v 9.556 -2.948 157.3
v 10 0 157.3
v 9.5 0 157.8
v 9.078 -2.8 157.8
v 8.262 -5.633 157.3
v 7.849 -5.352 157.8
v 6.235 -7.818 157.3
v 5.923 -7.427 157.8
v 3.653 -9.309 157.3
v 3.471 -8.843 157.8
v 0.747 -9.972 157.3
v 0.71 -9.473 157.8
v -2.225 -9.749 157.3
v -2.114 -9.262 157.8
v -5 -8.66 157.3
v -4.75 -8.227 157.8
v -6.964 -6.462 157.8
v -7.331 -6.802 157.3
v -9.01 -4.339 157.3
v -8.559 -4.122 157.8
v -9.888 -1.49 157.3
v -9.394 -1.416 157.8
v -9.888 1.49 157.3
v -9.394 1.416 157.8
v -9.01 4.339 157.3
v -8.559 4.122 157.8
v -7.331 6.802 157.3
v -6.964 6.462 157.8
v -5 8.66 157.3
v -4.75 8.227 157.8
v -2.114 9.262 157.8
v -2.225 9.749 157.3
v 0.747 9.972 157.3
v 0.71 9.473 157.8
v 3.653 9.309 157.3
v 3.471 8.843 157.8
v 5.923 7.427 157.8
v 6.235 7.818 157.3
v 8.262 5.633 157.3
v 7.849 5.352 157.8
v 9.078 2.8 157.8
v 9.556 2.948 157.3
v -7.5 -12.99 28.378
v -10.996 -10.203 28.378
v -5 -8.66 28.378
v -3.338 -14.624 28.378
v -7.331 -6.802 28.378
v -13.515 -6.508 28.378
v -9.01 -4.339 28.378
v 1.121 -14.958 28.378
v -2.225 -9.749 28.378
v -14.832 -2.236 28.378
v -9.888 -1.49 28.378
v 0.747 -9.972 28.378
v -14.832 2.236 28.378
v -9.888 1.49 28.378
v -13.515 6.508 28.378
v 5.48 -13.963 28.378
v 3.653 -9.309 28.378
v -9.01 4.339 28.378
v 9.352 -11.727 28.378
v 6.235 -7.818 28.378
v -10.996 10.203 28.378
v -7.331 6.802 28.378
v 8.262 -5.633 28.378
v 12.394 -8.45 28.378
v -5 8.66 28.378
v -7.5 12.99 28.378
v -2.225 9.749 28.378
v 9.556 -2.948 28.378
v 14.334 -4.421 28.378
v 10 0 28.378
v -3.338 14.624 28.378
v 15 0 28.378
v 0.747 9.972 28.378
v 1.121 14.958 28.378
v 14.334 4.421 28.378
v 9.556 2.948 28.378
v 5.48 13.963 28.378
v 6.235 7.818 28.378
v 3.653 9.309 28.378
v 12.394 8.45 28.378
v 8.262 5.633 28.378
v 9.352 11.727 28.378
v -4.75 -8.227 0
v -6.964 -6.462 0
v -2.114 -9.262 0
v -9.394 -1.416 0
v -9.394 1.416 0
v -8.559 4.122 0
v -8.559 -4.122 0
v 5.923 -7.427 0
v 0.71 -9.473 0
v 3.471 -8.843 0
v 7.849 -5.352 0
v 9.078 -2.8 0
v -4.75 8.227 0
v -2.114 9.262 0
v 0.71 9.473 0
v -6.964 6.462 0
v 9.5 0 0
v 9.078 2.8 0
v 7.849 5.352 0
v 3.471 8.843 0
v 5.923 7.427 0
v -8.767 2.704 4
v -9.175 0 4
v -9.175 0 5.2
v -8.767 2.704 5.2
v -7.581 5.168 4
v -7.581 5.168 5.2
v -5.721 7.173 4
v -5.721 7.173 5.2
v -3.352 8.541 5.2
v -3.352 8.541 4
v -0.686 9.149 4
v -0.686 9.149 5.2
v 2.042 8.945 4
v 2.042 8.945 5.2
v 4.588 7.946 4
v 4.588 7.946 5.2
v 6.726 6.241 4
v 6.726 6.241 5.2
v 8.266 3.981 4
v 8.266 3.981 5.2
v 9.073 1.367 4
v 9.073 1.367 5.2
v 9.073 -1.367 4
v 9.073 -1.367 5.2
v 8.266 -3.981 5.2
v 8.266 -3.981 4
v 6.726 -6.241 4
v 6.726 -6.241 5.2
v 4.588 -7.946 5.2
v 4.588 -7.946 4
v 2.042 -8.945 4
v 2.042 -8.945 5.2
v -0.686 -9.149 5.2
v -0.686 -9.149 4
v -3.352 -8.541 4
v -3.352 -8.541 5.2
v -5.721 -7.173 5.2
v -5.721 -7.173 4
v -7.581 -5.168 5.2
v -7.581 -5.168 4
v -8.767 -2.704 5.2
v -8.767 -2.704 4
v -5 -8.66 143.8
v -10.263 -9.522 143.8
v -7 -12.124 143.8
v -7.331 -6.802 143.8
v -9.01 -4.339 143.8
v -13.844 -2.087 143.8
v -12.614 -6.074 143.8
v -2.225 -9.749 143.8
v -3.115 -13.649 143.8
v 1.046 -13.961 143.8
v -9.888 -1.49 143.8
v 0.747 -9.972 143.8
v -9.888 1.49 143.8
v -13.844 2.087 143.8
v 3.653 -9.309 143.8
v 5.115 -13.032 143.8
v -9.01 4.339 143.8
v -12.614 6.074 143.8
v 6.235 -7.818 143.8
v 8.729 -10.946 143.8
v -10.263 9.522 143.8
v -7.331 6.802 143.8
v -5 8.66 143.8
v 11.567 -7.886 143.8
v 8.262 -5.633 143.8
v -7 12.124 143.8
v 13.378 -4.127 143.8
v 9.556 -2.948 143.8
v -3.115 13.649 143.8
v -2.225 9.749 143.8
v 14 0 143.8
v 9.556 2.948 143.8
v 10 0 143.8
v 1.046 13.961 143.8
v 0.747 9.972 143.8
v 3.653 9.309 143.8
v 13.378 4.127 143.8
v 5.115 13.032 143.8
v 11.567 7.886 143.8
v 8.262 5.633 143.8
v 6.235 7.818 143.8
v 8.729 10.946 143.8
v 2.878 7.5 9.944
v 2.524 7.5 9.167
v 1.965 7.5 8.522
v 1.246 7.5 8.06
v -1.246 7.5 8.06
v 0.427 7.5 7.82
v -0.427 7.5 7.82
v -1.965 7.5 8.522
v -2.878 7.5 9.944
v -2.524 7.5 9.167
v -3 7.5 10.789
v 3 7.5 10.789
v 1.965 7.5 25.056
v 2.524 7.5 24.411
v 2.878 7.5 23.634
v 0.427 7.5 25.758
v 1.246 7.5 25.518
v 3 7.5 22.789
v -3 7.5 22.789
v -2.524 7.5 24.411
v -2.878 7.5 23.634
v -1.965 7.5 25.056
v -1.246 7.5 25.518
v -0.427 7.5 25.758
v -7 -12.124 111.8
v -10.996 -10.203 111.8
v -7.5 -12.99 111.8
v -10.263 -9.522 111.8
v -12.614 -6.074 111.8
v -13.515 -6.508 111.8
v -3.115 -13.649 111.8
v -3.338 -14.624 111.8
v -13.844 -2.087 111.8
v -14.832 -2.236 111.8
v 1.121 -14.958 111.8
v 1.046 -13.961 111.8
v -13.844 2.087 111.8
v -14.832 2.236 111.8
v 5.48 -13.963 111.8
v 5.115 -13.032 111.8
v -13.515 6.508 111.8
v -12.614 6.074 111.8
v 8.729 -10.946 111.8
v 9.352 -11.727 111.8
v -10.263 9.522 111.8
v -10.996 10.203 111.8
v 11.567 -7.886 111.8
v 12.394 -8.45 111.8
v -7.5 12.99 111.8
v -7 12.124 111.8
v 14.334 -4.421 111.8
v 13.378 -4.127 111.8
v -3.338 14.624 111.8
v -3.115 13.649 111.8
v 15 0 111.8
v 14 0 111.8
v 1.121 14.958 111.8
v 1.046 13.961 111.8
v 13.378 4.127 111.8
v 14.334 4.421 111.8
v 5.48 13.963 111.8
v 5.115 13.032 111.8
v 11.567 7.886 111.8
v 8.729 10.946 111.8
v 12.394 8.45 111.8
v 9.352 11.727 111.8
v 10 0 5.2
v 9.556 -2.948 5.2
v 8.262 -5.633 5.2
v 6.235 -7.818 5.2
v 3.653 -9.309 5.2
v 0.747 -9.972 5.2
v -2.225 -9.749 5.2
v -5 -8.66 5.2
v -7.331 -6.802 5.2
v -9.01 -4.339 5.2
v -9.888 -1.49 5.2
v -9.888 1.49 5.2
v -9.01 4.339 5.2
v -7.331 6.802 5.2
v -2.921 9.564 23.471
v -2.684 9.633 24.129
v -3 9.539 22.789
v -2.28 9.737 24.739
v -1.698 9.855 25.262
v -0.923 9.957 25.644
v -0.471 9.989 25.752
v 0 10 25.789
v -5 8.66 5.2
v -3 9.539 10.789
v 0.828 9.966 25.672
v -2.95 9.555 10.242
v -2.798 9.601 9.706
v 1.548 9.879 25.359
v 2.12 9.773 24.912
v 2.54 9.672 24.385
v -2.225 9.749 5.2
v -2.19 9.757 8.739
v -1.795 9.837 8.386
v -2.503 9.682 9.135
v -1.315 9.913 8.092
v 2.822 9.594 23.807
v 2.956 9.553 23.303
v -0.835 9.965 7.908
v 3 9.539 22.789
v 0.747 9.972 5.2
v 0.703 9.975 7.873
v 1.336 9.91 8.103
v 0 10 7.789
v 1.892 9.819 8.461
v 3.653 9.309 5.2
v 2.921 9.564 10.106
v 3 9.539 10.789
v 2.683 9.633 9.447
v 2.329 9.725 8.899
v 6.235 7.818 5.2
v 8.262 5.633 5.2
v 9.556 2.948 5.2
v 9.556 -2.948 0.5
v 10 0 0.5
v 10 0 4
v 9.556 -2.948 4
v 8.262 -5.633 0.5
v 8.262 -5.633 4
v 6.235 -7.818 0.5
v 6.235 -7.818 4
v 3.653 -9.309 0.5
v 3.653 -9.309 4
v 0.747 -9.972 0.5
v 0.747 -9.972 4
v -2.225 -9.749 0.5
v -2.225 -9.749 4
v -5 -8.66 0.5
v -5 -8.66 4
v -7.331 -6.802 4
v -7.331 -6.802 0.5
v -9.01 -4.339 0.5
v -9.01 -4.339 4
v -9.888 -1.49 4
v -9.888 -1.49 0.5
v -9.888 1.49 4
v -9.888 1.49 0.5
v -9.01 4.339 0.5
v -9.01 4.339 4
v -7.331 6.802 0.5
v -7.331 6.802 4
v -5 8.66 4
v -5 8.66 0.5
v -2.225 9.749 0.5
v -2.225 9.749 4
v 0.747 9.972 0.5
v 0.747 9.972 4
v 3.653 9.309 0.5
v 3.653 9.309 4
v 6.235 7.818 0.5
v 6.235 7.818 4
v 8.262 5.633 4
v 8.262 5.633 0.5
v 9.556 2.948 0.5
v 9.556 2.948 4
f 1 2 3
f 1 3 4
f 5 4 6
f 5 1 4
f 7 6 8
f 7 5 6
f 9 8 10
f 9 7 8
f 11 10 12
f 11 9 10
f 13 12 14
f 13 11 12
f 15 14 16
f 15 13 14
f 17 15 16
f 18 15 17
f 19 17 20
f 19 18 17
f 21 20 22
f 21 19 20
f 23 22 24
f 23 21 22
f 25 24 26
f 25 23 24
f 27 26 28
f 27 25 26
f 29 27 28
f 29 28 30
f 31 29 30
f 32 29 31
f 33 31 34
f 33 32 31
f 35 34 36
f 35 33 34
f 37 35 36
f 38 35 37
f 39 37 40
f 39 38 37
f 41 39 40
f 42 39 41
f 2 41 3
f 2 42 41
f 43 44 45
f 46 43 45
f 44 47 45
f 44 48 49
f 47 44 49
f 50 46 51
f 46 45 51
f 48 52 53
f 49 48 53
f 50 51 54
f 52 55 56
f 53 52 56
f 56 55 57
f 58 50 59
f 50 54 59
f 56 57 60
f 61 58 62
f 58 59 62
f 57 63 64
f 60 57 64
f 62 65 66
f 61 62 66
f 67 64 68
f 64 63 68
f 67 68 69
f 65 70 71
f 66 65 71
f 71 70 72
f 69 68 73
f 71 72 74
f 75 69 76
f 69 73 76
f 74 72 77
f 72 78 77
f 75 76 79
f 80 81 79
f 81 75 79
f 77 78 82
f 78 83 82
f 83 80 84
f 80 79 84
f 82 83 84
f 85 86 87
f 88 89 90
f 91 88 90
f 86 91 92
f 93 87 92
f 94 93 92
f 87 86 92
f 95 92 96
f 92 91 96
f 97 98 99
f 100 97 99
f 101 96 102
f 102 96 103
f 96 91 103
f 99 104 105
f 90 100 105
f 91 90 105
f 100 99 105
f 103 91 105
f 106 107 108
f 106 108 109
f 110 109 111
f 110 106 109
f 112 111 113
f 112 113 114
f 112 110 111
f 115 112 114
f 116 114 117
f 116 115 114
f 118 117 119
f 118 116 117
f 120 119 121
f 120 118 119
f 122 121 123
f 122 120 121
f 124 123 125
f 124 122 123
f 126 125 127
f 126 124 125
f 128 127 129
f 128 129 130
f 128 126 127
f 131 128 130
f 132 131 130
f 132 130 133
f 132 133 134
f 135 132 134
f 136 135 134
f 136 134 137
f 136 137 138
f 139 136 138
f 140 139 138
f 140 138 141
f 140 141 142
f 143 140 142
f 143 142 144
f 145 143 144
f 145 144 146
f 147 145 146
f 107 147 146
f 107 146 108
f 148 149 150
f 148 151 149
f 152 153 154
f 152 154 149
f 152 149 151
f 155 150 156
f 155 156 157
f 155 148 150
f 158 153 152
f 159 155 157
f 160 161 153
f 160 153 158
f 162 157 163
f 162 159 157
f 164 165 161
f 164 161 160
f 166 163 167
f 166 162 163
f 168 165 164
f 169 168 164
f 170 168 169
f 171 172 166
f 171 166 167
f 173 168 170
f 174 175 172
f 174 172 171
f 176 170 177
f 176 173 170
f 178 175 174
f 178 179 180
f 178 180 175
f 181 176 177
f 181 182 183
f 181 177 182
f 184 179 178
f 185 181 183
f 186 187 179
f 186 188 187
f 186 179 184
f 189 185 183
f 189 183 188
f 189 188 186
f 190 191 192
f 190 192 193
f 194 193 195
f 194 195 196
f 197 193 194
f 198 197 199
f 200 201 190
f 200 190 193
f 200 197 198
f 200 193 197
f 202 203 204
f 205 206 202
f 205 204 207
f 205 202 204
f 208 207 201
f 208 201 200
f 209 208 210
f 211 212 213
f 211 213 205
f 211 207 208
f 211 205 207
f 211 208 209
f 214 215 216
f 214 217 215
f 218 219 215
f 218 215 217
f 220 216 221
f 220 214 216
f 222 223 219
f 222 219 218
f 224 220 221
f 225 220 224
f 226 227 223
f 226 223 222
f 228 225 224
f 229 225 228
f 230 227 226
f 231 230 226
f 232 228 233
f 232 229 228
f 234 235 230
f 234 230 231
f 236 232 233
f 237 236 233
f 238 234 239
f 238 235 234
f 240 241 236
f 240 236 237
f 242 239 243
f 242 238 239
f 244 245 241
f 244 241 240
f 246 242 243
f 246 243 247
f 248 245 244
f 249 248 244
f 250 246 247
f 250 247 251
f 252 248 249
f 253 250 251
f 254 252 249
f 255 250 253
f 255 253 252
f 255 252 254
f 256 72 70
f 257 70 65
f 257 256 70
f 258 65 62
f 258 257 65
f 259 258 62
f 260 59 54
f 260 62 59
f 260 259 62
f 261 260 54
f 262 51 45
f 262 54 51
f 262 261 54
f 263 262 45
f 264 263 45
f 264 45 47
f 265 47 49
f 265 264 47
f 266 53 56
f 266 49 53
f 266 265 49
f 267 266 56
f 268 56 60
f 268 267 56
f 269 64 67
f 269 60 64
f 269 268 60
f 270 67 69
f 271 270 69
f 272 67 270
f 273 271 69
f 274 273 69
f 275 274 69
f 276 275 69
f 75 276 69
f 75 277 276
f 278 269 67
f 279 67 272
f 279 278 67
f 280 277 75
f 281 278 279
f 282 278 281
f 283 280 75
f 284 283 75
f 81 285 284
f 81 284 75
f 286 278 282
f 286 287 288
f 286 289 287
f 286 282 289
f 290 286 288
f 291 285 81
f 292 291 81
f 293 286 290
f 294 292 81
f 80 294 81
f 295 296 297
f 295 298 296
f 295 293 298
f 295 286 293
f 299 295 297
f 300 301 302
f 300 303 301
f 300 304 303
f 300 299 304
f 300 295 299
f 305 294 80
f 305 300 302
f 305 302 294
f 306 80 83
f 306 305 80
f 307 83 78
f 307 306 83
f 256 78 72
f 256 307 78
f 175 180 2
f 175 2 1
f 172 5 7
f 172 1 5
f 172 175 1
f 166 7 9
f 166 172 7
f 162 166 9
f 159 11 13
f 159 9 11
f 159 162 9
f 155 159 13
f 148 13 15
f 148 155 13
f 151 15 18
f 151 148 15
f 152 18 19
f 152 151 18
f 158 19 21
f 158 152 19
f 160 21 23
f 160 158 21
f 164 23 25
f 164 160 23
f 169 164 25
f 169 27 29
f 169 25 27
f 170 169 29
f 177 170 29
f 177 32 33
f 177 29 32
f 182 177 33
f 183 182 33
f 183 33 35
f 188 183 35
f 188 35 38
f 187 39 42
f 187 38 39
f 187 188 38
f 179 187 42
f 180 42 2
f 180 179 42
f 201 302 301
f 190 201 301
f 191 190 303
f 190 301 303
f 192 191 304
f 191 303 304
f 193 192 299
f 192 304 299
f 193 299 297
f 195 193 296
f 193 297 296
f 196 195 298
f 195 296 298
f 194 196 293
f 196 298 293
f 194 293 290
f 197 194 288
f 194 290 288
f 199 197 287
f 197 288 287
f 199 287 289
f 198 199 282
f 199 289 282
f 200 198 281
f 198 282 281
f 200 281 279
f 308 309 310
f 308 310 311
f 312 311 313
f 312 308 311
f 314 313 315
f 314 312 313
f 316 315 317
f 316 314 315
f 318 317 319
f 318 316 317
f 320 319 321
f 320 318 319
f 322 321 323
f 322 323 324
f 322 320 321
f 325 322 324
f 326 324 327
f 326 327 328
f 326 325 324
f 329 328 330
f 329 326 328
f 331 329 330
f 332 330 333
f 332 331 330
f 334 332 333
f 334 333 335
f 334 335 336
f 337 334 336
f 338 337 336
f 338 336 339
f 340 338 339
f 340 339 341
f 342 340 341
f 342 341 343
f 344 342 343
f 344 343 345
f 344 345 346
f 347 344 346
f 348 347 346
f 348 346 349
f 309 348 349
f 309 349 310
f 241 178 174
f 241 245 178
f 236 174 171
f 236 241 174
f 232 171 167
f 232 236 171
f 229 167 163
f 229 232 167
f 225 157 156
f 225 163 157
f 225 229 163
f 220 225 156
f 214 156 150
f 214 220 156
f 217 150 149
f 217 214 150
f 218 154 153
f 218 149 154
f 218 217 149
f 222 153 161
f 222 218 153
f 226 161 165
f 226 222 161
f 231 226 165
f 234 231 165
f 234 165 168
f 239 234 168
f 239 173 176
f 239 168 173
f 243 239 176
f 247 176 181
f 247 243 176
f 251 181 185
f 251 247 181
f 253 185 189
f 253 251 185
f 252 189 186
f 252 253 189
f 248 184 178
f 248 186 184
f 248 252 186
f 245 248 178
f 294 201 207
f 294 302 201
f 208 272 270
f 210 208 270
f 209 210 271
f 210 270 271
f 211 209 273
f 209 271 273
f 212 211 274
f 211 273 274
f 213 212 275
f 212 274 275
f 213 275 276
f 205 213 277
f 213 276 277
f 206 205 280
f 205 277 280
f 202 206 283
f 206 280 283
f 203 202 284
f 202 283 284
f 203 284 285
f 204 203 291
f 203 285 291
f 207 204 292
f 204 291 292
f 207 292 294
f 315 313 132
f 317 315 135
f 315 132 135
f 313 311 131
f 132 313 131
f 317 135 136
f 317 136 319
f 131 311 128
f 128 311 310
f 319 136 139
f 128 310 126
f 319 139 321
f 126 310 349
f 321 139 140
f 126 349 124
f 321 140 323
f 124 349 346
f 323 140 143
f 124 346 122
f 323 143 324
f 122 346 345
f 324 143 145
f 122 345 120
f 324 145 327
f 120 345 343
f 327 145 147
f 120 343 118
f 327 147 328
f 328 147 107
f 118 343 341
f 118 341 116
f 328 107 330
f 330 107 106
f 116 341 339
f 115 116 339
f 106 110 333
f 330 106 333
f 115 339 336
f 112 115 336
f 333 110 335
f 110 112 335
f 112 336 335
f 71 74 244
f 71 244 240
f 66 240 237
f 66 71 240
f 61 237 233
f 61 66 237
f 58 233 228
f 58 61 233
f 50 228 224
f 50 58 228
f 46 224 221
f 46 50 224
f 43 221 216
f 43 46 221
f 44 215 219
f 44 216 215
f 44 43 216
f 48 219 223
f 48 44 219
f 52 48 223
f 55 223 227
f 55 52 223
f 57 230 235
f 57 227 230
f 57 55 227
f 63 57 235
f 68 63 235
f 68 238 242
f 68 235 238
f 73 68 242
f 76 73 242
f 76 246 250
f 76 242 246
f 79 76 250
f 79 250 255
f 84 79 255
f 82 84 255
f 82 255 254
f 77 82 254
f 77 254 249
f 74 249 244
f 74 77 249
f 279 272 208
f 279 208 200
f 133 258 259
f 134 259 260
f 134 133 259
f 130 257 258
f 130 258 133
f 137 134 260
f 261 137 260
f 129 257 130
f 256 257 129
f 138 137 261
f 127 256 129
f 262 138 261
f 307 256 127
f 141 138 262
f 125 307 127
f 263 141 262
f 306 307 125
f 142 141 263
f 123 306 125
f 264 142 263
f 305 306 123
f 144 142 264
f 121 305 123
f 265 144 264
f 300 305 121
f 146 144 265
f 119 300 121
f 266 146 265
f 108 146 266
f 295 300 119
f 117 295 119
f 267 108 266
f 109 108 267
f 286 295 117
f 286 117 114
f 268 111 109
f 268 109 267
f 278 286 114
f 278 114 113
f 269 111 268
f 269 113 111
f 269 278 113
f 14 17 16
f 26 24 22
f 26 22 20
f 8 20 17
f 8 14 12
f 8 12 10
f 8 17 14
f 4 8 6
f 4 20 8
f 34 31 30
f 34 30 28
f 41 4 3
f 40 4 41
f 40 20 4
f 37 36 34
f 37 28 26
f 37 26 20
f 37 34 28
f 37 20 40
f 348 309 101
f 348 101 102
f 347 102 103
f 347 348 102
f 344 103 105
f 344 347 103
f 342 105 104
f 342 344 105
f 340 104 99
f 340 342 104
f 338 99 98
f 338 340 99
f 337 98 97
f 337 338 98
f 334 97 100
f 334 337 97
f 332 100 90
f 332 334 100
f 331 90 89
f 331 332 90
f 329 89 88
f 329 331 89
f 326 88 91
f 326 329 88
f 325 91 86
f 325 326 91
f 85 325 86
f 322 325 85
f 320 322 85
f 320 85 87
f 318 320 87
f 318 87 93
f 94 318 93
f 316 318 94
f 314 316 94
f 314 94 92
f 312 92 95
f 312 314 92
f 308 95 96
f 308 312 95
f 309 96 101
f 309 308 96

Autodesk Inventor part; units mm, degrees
ref_plane "YZ Plane" through (0, 0, 0) normal (1, 0, 0) x (0, 1, 0)
ref_plane "XY Plane" through (0, 0, 0) normal (0, 0, 1) x (1, 0, 0)
sketch "草图1" plane through (0, 0, 0) normal (0, 0, 1) x (1, 0, 0)
  circle A0 centre (0, 0) radius 10
  dimension "d0" = 20
extrude "拉伸1" add sketch "草图1" along normal blind 28.378
sketch "草图2" plane through (0, 0, 28.378) normal (0, 0, 1) x (1, 0, 0)
  circle A0 centre (0, 0) radius 15
  dimension "d3" = 30
extrude "拉伸2" add sketch "草图2" along normal blind 83.422
sketch "草图3" plane through (0, 0, 111.8) normal (0, 0, 1) x (1, 0, 0)
  circle A0 centre (0, 0) radius 14
  dimension "d6" = 28
extrude "拉伸3" add sketch "草图3" along normal blind 32
sketch "草图4" plane through (0, 0, 143.8) normal (0, 0, 1) x (1, 0, 0)
  circle A0 centre (0, 0) radius 10
  dimension "d9" = 20
extrude "拉伸4" add sketch "草图4" along normal blind 14
ref_plane "工作平面1" through (0, 10, 0) normal (0, 1, 0) x (-1, 0, 0)
sketch "草图5" plane through (0, 10, 0) normal (0, 1, 0) x (-1, 0, 0)
  line L0 (-3, 22.789) -> (3, 22.789)
  line L1 (3, 22.789) -> (3, 10.789)
  line L2 (3, 10.789) -> (-3, 10.789)
  line L3 (-3, 10.789) -> (-3, 22.789)
  arc A0 (3, 22.789) -> (-3, 22.789) centre (0, 22.789) ccw
  arc A1 (-3, 10.789) -> (3, 10.789) centre (0, 10.789) ccw
  line L4 (0, 0) -> (0, -4.7288)
  line L5 (10, 28.378) -> (-10, 28.378) projected
  dimension "d12" = 4.7288
  dimension "d13" = 6
  dimension "d14" = 12
  dimension "d21" = 5.589
extrude "拉伸5" cut sketch "草图5" against normal blind 2.5
chamfer "倒角1" distance 0.5 angle 45 2 edges at (-10, 0, 0) (-10, 0, 157.8)
sketch "草图6" plane through (0, 0, 0) normal (0, 1, 0) x (-1, 0, 0)
  line L0 (14.4109, 5.2) -> (9.175, 5.2)
  line L1 (9.175, 5.2) -> (9.175, 4)
  line L2 (9.175, 4) -> (14.4109, 4)
  line L3 (14.4109, 4) -> (14.4109, 5.2)
  line L4 (9.5, 0) -> (-9.5, 0) projected
  line L5 (0, 0) -> (0, -3.7924)
  dimension "d22" = 4
  dimension "d23" = 1.2
  dimension "d24" = 3.7924
  dimension "d25" = 9.175
  dimension "d26" = 5.2359
revolve "旋转1" cut sketch "草图6" angle 360 about axis through (0, 0, 0) along (0, 0, -1)
properties part number "齿轮150配件"
